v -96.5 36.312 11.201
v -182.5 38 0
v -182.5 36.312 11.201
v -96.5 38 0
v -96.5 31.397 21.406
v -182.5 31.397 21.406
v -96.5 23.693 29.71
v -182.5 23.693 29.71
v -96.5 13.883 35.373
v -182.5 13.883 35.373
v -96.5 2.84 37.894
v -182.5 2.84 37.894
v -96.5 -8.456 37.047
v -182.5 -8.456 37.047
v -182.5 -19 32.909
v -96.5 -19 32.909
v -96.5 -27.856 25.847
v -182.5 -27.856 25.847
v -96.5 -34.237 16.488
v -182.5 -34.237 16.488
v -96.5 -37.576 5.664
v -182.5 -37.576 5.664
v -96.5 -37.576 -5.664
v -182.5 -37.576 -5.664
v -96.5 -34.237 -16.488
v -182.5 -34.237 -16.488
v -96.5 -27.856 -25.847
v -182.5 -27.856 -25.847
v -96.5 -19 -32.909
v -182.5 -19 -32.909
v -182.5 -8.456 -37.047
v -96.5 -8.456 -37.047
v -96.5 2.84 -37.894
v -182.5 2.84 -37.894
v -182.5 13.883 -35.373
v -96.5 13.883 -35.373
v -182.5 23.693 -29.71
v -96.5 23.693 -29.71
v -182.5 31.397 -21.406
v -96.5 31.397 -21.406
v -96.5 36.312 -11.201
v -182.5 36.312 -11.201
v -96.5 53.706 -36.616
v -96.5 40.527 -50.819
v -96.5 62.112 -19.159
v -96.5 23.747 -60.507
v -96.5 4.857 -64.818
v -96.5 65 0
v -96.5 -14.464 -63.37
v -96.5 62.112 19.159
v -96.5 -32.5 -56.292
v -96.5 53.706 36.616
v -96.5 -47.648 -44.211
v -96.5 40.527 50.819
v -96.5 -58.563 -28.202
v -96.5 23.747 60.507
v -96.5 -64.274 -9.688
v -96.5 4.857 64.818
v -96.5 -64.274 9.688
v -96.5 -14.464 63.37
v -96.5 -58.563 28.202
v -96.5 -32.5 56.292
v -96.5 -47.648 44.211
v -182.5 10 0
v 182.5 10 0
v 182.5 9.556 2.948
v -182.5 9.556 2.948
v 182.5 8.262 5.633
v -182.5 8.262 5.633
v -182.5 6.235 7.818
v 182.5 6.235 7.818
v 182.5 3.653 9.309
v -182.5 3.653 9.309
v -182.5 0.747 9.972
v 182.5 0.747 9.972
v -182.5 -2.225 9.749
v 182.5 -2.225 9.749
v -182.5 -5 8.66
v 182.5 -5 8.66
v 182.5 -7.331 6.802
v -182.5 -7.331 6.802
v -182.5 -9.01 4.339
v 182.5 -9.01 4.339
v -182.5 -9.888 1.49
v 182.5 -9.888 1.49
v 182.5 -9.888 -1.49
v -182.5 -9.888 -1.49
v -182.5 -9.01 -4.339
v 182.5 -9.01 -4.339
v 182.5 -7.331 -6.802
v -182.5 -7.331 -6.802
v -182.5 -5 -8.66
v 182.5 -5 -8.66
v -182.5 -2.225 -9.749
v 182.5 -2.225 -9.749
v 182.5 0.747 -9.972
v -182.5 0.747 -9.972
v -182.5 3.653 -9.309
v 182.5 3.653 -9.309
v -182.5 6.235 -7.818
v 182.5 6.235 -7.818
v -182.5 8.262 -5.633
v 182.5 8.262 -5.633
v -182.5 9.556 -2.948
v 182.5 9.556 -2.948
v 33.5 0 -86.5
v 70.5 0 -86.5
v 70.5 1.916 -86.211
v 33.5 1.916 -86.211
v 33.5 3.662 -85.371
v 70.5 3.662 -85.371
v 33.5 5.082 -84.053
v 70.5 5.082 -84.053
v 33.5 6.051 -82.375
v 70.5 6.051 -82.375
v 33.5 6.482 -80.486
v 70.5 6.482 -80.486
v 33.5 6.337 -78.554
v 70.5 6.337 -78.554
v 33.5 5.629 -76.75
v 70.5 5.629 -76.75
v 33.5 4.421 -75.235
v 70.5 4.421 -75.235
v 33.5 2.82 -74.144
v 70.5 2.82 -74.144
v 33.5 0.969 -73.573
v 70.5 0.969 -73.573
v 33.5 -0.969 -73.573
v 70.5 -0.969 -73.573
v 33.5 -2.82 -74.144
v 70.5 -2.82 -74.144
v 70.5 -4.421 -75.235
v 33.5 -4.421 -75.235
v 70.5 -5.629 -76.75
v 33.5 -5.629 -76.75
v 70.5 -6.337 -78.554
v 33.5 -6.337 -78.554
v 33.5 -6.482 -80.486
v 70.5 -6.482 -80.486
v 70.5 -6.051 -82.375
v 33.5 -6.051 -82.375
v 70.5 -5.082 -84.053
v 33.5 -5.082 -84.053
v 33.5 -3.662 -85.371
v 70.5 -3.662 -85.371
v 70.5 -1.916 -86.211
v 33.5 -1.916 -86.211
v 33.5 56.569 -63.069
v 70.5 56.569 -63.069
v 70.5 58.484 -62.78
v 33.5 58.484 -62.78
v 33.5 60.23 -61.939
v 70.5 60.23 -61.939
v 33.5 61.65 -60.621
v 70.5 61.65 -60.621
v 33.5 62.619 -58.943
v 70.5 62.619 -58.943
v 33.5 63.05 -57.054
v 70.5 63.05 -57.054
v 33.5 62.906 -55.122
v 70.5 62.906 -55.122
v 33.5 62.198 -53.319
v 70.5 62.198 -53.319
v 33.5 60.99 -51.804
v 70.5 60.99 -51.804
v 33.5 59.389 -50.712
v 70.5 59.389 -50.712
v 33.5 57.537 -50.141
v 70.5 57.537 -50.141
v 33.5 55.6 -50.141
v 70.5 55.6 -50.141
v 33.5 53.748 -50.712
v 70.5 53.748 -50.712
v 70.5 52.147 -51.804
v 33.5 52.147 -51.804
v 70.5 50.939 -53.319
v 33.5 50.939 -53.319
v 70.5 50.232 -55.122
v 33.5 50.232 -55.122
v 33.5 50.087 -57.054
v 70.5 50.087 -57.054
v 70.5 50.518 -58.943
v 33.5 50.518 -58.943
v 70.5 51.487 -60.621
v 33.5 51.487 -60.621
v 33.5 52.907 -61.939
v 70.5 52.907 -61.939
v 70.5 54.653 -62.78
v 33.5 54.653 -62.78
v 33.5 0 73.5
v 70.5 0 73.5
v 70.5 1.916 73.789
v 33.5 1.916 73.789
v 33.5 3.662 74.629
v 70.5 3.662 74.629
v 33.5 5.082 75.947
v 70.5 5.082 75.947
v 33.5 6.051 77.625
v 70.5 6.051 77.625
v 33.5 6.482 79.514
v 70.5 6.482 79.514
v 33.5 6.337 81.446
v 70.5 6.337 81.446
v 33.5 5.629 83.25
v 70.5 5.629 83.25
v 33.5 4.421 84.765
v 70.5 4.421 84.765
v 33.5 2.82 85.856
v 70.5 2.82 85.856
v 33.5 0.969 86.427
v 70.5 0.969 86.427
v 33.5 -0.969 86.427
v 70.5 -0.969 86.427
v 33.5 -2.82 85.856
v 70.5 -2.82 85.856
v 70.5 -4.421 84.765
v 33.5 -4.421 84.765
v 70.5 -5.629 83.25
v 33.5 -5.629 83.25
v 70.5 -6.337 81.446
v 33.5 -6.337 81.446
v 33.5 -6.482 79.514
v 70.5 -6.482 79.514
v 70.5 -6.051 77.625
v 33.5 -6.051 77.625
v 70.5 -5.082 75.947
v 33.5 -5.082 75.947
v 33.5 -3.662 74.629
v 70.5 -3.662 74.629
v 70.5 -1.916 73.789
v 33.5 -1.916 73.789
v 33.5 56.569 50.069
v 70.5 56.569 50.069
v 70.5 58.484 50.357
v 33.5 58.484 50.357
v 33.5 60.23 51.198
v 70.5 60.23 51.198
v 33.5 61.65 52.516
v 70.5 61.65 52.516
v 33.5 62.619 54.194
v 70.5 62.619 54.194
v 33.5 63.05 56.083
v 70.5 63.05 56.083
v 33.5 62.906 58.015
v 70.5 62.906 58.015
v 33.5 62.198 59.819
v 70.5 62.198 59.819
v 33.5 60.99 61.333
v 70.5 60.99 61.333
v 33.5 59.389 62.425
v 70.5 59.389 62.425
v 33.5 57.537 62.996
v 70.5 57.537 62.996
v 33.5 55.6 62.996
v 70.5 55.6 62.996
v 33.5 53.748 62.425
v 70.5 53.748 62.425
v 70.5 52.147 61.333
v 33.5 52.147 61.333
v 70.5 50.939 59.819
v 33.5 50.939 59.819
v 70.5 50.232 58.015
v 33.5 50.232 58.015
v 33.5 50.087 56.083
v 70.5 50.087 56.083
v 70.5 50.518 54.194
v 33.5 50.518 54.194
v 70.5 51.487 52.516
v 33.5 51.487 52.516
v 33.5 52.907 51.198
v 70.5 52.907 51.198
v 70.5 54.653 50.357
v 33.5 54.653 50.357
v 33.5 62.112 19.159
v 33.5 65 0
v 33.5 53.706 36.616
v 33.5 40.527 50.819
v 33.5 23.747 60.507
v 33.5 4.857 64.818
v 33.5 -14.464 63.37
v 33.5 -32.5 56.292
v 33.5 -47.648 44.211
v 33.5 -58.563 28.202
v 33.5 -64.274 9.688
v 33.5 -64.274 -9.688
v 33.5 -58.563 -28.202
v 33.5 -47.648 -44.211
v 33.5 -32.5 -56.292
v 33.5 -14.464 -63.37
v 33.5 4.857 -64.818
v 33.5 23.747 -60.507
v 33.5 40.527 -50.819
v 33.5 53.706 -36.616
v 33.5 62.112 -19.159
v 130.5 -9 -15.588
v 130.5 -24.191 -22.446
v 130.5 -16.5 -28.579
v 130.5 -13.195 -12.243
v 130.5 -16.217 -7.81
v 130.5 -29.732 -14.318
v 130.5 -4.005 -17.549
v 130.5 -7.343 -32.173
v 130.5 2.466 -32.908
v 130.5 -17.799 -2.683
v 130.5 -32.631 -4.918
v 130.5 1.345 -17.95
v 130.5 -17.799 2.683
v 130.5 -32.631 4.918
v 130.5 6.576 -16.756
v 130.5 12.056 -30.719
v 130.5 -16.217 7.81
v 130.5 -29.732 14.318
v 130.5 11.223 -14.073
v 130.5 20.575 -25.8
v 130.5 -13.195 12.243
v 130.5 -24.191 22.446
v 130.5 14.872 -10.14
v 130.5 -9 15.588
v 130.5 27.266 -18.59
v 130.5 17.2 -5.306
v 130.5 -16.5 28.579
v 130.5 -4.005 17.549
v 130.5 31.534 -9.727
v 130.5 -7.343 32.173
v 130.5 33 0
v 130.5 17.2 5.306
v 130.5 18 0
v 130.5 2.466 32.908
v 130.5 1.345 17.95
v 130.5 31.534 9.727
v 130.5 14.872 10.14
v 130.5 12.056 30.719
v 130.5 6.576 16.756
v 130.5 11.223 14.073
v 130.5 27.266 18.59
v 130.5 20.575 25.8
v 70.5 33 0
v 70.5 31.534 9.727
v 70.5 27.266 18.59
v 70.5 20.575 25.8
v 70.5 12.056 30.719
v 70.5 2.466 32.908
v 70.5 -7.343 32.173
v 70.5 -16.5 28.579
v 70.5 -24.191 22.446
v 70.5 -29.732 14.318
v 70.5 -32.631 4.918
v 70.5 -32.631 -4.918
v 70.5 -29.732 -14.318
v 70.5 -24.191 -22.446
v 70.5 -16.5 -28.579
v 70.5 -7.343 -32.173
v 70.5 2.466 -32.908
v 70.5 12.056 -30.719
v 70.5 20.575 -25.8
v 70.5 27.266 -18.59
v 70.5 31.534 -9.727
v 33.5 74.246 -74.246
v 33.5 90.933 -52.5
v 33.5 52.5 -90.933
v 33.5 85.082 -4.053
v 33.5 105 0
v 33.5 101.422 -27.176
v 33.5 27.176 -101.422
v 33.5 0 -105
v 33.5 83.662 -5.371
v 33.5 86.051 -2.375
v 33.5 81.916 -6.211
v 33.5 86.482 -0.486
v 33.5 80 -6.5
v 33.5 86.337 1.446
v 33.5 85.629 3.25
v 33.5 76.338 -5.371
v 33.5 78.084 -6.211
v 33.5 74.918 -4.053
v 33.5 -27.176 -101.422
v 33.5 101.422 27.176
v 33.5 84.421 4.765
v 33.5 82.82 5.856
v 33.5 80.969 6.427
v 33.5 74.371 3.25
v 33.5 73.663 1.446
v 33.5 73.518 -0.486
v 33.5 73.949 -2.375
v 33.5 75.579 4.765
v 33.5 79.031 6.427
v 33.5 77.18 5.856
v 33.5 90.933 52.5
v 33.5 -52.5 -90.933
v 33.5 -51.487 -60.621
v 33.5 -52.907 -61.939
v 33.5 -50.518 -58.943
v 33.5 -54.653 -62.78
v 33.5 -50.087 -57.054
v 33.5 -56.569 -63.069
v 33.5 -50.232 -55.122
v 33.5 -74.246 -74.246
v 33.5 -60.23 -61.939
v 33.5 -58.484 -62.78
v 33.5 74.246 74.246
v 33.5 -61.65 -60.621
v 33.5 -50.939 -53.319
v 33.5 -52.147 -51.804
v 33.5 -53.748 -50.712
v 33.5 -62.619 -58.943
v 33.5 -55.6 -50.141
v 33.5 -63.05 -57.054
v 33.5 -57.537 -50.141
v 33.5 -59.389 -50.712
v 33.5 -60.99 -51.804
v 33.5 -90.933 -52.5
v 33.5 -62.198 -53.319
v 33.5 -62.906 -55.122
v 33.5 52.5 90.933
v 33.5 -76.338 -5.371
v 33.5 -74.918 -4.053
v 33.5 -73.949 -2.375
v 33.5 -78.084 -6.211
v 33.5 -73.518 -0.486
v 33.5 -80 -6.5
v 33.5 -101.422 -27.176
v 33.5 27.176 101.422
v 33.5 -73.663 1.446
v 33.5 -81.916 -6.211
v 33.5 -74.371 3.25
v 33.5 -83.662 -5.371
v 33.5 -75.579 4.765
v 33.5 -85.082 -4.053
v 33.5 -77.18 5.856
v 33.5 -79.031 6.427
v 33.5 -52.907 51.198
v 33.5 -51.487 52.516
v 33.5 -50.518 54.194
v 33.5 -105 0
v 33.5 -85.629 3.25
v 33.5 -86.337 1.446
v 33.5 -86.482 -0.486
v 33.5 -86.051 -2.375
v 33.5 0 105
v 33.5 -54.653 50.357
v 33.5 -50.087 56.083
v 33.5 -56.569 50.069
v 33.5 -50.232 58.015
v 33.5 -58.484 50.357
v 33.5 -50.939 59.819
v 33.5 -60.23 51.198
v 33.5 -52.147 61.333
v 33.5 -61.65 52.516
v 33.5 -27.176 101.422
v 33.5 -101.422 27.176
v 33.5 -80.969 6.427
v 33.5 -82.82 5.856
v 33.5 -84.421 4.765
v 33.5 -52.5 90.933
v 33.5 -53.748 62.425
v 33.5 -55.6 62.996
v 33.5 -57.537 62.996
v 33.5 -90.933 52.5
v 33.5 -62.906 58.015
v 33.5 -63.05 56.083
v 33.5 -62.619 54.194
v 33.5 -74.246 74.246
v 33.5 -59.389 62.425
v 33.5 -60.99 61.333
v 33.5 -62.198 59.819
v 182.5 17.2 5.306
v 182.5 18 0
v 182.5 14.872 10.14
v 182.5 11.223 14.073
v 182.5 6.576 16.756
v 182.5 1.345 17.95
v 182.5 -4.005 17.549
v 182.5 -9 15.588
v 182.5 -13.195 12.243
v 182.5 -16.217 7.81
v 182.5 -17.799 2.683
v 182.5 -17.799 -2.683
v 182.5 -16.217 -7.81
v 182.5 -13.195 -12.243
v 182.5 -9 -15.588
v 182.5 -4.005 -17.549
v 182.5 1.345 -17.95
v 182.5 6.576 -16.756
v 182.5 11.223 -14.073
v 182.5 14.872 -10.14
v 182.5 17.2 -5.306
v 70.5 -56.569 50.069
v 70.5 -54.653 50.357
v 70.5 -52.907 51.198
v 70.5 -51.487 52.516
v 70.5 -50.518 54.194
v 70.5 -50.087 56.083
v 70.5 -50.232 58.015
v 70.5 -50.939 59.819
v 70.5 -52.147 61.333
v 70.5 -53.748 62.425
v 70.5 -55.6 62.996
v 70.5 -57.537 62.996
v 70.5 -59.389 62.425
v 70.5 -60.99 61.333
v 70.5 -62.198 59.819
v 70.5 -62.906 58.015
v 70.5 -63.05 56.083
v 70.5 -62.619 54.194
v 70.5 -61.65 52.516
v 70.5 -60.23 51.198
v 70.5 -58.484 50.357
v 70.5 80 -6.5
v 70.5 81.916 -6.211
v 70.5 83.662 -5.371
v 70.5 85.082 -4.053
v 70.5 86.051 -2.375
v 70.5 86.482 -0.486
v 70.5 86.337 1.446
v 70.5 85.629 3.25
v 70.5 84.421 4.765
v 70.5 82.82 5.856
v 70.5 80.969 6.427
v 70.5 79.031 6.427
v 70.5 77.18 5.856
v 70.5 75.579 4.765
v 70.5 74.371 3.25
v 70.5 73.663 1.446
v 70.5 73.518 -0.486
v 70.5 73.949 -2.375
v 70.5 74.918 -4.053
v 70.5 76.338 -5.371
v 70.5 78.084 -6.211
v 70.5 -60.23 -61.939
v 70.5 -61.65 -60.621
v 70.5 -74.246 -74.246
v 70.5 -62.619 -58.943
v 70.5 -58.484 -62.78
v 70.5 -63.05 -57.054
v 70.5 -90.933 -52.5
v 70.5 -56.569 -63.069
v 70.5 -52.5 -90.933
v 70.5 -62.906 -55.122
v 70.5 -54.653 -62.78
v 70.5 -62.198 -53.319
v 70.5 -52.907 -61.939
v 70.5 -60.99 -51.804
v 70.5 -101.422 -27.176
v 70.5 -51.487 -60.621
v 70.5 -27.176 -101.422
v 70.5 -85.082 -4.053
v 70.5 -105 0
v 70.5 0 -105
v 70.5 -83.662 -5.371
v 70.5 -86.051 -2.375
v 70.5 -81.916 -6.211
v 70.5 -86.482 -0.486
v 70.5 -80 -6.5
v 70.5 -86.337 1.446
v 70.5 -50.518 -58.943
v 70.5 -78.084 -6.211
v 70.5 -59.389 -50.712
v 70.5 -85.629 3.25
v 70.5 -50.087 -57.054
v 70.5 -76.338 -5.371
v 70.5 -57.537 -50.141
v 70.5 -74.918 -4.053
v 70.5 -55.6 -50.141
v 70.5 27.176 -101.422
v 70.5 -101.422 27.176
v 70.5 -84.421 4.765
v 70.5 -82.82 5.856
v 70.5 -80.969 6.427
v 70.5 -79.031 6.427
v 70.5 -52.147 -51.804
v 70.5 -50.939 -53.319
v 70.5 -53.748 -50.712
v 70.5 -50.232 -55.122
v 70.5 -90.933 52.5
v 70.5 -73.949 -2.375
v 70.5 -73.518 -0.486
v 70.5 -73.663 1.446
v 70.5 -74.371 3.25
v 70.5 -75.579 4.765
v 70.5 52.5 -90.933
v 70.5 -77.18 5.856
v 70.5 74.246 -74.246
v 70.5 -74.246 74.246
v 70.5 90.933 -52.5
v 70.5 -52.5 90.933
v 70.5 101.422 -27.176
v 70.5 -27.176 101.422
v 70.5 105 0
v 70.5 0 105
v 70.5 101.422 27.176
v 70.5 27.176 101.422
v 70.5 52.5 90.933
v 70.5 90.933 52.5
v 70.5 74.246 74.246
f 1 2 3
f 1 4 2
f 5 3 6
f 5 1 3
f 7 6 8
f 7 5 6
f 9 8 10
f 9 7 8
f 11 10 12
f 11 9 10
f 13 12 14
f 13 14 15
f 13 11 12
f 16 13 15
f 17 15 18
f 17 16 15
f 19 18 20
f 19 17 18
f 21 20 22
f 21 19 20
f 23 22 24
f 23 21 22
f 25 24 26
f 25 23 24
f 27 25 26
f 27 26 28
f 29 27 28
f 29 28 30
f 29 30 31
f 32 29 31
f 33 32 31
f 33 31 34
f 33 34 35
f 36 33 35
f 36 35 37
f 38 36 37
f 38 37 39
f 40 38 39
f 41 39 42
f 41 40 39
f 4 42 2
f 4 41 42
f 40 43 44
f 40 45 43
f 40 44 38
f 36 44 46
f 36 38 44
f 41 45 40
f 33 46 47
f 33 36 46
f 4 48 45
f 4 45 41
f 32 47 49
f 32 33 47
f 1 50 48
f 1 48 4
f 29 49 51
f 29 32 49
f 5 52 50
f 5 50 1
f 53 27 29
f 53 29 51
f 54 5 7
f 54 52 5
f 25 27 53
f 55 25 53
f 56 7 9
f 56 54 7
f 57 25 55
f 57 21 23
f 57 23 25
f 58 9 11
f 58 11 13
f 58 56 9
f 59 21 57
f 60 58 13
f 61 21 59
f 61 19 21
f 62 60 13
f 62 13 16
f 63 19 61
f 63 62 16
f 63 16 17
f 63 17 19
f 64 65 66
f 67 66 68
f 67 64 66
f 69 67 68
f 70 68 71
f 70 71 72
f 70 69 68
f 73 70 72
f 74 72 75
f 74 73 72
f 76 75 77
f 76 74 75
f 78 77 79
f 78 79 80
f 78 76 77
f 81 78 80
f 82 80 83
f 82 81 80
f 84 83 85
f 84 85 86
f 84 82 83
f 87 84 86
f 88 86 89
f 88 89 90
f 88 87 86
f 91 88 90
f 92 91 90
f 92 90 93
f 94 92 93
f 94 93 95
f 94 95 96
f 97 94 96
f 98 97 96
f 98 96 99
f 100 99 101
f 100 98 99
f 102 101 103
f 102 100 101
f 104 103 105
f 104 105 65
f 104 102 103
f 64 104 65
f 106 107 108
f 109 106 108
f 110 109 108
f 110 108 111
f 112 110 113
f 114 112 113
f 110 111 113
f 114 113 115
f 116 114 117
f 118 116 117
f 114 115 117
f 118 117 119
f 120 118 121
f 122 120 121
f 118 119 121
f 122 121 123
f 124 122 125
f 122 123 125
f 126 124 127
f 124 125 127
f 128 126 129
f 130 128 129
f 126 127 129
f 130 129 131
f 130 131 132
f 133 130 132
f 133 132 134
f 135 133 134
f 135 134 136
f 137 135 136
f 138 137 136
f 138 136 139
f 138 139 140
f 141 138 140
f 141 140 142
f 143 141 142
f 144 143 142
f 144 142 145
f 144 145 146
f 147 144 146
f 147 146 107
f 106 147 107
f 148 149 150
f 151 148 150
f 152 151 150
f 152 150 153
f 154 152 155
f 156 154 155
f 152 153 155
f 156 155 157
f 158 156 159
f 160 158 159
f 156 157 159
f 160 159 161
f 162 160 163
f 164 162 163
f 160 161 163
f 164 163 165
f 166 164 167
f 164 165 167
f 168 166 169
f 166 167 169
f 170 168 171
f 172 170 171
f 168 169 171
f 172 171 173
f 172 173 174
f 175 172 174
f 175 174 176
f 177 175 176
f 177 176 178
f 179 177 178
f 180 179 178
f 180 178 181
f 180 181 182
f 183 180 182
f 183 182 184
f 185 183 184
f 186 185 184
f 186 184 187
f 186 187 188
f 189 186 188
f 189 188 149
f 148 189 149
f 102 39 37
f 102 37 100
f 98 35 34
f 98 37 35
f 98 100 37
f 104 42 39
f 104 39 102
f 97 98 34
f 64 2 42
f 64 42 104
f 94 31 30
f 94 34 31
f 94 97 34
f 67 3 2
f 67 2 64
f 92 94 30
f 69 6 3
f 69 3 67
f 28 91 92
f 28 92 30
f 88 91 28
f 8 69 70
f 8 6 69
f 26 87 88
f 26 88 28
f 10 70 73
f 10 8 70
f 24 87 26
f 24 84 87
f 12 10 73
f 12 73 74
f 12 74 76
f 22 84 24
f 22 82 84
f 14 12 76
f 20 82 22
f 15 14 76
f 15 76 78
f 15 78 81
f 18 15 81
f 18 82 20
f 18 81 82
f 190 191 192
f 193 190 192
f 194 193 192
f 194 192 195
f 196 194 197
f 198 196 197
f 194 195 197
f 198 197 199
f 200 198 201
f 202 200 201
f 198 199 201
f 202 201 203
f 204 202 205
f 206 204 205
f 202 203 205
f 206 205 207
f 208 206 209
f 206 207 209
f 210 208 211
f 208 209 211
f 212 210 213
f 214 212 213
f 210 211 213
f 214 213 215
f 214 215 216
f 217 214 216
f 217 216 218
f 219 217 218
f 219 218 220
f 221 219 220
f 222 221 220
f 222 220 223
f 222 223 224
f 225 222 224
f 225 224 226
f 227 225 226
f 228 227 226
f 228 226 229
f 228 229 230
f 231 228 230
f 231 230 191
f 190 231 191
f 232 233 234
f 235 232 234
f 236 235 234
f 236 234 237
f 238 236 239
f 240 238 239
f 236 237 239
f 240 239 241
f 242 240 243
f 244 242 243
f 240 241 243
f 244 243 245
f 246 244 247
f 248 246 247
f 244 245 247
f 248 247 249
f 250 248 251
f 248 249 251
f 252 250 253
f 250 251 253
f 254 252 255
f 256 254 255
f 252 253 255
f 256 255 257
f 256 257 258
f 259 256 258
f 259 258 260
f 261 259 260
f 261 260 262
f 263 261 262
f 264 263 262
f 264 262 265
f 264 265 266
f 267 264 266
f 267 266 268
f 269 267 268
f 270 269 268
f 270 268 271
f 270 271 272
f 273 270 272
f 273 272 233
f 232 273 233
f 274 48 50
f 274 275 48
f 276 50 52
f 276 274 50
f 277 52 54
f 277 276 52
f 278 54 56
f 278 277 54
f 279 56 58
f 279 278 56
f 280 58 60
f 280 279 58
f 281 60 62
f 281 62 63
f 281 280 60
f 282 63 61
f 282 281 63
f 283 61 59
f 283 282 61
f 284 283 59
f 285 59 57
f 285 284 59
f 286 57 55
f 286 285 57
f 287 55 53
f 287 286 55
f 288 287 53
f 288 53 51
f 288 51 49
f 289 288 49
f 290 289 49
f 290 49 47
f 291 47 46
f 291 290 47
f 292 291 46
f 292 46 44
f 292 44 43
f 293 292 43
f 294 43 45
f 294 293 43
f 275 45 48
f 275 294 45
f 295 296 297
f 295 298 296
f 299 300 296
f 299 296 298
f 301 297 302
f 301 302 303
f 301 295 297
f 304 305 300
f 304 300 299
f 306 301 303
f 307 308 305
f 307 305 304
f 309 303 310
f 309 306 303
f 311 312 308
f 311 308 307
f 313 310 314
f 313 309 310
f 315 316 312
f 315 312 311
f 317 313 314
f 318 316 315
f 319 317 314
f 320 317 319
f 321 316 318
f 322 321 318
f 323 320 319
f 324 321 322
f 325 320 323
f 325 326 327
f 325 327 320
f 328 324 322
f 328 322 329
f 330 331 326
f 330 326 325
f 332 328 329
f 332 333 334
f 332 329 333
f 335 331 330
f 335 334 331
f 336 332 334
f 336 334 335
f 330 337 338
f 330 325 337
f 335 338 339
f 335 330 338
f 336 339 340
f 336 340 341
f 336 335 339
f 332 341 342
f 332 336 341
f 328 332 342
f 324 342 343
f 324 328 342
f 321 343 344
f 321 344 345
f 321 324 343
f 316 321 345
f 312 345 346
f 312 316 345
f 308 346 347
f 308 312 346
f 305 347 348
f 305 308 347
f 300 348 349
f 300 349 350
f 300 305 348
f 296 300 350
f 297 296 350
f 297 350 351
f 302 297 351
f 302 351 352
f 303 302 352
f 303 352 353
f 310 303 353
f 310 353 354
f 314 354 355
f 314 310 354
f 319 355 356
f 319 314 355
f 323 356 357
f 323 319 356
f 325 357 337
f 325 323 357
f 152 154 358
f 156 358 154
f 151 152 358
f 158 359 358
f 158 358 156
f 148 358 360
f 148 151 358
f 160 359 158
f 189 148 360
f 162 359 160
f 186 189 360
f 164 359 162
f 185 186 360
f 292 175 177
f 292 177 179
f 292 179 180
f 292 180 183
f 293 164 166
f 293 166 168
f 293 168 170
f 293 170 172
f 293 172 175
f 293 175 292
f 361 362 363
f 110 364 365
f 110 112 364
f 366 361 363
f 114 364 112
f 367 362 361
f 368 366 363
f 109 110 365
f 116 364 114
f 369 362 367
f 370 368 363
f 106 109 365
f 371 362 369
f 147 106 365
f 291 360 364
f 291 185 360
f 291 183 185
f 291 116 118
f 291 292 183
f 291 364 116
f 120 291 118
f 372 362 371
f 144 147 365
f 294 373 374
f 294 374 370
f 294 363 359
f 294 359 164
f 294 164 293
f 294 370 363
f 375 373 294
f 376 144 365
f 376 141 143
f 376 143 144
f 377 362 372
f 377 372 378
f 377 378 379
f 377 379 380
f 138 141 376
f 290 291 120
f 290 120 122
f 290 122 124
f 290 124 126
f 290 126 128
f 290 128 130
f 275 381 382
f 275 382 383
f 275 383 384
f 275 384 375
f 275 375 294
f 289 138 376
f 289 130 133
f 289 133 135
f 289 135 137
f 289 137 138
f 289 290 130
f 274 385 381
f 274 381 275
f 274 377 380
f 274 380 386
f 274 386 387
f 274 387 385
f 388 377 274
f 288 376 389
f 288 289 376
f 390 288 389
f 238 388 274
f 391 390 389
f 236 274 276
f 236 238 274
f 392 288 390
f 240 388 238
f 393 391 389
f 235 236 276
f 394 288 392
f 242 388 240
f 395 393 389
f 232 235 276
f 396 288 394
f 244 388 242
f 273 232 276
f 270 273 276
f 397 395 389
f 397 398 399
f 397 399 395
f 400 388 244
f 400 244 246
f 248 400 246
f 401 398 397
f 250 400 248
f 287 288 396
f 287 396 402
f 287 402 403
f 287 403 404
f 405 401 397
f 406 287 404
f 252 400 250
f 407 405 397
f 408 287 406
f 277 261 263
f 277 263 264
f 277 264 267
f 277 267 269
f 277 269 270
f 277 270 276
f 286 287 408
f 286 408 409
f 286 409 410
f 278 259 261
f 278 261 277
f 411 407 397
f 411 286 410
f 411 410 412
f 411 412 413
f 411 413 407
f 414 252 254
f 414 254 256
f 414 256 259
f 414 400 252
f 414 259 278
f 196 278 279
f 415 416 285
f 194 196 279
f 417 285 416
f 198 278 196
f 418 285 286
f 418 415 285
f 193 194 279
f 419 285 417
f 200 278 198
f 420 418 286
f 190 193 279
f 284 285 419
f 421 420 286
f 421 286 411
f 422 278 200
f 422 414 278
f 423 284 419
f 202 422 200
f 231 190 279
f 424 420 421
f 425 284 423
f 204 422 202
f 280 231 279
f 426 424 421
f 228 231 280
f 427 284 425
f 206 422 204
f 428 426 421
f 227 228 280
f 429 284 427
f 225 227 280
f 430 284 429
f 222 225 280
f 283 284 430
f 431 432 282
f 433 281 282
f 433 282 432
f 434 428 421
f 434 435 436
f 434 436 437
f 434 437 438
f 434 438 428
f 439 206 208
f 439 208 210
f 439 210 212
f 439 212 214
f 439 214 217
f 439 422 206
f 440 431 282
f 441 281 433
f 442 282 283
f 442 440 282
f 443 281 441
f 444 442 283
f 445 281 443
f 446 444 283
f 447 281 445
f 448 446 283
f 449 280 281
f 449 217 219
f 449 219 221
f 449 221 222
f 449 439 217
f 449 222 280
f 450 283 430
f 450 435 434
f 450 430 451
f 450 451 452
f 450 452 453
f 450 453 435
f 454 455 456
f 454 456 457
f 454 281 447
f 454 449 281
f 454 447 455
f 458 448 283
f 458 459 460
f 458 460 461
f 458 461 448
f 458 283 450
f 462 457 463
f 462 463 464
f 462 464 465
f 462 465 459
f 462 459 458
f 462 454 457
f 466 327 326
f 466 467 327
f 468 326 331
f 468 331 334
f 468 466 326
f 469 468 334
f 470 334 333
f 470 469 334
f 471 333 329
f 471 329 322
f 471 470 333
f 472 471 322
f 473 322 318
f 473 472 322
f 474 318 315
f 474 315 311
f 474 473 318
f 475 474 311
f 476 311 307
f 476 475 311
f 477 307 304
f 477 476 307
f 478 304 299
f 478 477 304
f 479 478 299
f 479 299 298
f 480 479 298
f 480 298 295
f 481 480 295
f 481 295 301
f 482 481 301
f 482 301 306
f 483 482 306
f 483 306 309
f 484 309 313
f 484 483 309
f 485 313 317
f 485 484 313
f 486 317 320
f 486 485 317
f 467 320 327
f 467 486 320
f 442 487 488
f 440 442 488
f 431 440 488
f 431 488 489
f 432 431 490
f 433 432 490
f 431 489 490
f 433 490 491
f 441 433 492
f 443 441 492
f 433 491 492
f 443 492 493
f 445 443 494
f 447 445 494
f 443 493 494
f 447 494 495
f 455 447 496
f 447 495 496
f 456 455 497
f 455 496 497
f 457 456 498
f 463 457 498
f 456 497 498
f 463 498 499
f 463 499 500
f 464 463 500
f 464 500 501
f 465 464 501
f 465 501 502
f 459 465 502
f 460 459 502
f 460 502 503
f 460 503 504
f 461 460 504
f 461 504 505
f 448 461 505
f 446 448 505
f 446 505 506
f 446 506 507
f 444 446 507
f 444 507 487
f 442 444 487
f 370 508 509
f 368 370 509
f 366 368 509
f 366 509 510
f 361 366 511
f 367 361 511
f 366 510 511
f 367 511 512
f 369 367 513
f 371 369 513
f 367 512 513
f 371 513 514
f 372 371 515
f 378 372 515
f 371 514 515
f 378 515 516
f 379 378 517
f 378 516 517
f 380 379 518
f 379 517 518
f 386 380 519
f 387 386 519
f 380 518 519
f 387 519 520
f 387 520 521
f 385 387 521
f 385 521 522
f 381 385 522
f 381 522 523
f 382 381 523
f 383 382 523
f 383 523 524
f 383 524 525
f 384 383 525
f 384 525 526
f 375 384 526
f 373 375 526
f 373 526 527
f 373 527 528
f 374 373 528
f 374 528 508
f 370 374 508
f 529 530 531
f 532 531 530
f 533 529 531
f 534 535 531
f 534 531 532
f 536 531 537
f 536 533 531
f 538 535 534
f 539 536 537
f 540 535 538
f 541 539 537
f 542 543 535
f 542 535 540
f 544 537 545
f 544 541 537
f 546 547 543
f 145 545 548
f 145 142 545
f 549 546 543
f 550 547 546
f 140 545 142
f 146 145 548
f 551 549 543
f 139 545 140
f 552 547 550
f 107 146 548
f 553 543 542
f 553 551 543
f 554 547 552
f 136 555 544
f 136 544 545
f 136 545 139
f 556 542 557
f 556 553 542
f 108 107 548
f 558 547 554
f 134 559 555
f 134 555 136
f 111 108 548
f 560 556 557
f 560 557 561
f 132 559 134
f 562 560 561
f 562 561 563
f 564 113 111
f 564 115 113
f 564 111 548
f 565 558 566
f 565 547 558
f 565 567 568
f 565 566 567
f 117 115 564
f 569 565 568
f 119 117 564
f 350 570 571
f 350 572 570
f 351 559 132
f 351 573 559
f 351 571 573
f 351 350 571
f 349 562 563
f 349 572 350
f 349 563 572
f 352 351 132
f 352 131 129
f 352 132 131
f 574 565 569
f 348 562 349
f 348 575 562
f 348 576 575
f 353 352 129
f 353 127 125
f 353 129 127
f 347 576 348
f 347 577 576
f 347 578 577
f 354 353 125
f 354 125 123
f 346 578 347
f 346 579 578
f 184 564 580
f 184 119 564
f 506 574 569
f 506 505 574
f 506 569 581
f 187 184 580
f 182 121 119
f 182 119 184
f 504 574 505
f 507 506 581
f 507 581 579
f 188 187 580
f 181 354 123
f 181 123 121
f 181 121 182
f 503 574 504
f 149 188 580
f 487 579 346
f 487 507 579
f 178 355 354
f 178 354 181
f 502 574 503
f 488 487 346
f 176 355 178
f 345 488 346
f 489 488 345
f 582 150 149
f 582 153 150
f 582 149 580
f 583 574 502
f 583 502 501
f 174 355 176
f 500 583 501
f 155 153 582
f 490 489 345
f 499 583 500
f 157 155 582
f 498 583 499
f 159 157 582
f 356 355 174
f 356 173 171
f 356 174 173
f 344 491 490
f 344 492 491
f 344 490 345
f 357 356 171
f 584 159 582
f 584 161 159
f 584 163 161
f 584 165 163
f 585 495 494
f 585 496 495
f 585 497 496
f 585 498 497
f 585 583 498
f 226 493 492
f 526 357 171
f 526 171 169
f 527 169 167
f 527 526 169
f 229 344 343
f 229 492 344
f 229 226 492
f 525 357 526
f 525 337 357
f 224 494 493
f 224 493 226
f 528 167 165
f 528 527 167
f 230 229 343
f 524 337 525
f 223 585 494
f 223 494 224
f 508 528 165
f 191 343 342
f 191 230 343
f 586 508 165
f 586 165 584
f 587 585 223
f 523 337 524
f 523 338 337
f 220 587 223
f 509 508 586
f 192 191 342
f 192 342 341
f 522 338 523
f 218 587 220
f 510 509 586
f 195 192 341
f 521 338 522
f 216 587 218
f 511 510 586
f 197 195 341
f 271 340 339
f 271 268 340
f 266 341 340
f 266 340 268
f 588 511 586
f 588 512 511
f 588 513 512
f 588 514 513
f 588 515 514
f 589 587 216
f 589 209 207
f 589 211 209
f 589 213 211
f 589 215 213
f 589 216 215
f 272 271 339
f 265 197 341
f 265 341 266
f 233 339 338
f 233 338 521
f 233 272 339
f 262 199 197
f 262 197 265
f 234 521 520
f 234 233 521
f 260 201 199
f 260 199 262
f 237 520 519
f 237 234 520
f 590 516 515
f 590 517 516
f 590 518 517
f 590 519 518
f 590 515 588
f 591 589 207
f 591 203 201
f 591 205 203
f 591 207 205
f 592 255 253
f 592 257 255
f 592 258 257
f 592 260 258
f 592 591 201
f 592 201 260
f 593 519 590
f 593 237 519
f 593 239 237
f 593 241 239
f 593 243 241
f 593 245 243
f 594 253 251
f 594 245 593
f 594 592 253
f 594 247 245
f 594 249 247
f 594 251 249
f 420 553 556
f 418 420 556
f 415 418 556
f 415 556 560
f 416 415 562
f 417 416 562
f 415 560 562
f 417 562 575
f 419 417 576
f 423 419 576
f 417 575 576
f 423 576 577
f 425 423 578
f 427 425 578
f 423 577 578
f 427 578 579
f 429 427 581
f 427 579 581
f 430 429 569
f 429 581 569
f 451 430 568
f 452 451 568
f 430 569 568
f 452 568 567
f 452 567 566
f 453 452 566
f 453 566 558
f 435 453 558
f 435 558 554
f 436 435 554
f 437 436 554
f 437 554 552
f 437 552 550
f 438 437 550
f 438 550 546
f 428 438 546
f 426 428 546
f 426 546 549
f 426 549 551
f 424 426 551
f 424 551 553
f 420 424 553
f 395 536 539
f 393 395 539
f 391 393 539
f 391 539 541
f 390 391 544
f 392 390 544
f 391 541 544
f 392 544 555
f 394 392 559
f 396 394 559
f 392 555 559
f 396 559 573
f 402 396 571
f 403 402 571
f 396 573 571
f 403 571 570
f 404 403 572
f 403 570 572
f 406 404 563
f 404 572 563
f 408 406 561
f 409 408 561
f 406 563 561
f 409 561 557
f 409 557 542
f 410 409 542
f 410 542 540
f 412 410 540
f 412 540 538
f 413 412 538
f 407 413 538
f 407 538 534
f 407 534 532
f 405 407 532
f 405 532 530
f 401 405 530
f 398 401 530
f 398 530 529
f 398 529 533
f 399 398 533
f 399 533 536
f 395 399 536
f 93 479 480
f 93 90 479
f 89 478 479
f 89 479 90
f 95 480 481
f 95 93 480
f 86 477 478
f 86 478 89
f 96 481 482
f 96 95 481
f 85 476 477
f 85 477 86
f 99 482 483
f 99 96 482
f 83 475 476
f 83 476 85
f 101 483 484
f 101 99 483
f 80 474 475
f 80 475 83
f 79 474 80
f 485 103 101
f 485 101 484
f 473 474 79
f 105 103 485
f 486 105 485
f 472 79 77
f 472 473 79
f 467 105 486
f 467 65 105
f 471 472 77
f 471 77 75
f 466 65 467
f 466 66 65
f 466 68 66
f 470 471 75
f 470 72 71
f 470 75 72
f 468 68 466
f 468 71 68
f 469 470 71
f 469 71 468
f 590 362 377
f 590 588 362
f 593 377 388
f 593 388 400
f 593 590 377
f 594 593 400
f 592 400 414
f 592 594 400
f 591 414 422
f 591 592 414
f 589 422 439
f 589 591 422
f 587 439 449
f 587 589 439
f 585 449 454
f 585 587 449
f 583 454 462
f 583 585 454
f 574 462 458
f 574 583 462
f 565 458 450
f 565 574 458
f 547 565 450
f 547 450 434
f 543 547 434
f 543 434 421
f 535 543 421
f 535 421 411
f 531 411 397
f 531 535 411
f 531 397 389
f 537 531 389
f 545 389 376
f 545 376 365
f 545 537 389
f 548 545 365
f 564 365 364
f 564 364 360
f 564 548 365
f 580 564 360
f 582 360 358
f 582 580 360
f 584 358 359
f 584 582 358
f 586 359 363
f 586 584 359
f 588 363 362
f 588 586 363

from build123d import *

# Parameters (mm, degrees)
SKETCH2_R          = 6.5
CUT_EXTRUDE1_DEPTH = 254


with BuildPart() as part:
    # Sketch1 → Revolve1 (revolve)
    with BuildSketch(Plane.XY):
        Polygon((-182.5, 10), (-182.5, 38), (-96.5, 38), (-96.5, 65), (33.5, 65), (33.5, 105), (70.5, 105), (70.5, 33), (130.5, 33), (130.5, 18), (182.5, 18), (182.5, 10), align=None)
    revolve(axis=Axis((-194.069566155, 0, 0), (1, 0, 0)))

    # Sketch2 → Cut-Extrude1 (cut, through all)
    with BuildSketch(Plane(origin=(70.5, 0, 0), x_dir=(0, 0, -1), z_dir=(1, 0, 0))):
        with Locations((0, 80)):
            Circle(SKETCH2_R)
        with Locations((56.568542495, 56.568542495)):
            Circle(SKETCH2_R)
        with Locations((80, 0)):
            Circle(SKETCH2_R)
        with Locations((56.568542495, -56.568542495)):
            Circle(SKETCH2_R)
        with Locations((0, -80)):
            Circle(SKETCH2_R)
        with Locations((-56.568542495, -56.568542495)):
            Circle(SKETCH2_R)
        with Locations((-80, 0)):
            Circle(SKETCH2_R)
        with Locations((-56.568542495, 56.568542495)):
            Circle(SKETCH2_R)
    extrude(amount=-CUT_EXTRUDE1_DEPTH, mode=Mode.SUBTRACT)


solid = part.part
